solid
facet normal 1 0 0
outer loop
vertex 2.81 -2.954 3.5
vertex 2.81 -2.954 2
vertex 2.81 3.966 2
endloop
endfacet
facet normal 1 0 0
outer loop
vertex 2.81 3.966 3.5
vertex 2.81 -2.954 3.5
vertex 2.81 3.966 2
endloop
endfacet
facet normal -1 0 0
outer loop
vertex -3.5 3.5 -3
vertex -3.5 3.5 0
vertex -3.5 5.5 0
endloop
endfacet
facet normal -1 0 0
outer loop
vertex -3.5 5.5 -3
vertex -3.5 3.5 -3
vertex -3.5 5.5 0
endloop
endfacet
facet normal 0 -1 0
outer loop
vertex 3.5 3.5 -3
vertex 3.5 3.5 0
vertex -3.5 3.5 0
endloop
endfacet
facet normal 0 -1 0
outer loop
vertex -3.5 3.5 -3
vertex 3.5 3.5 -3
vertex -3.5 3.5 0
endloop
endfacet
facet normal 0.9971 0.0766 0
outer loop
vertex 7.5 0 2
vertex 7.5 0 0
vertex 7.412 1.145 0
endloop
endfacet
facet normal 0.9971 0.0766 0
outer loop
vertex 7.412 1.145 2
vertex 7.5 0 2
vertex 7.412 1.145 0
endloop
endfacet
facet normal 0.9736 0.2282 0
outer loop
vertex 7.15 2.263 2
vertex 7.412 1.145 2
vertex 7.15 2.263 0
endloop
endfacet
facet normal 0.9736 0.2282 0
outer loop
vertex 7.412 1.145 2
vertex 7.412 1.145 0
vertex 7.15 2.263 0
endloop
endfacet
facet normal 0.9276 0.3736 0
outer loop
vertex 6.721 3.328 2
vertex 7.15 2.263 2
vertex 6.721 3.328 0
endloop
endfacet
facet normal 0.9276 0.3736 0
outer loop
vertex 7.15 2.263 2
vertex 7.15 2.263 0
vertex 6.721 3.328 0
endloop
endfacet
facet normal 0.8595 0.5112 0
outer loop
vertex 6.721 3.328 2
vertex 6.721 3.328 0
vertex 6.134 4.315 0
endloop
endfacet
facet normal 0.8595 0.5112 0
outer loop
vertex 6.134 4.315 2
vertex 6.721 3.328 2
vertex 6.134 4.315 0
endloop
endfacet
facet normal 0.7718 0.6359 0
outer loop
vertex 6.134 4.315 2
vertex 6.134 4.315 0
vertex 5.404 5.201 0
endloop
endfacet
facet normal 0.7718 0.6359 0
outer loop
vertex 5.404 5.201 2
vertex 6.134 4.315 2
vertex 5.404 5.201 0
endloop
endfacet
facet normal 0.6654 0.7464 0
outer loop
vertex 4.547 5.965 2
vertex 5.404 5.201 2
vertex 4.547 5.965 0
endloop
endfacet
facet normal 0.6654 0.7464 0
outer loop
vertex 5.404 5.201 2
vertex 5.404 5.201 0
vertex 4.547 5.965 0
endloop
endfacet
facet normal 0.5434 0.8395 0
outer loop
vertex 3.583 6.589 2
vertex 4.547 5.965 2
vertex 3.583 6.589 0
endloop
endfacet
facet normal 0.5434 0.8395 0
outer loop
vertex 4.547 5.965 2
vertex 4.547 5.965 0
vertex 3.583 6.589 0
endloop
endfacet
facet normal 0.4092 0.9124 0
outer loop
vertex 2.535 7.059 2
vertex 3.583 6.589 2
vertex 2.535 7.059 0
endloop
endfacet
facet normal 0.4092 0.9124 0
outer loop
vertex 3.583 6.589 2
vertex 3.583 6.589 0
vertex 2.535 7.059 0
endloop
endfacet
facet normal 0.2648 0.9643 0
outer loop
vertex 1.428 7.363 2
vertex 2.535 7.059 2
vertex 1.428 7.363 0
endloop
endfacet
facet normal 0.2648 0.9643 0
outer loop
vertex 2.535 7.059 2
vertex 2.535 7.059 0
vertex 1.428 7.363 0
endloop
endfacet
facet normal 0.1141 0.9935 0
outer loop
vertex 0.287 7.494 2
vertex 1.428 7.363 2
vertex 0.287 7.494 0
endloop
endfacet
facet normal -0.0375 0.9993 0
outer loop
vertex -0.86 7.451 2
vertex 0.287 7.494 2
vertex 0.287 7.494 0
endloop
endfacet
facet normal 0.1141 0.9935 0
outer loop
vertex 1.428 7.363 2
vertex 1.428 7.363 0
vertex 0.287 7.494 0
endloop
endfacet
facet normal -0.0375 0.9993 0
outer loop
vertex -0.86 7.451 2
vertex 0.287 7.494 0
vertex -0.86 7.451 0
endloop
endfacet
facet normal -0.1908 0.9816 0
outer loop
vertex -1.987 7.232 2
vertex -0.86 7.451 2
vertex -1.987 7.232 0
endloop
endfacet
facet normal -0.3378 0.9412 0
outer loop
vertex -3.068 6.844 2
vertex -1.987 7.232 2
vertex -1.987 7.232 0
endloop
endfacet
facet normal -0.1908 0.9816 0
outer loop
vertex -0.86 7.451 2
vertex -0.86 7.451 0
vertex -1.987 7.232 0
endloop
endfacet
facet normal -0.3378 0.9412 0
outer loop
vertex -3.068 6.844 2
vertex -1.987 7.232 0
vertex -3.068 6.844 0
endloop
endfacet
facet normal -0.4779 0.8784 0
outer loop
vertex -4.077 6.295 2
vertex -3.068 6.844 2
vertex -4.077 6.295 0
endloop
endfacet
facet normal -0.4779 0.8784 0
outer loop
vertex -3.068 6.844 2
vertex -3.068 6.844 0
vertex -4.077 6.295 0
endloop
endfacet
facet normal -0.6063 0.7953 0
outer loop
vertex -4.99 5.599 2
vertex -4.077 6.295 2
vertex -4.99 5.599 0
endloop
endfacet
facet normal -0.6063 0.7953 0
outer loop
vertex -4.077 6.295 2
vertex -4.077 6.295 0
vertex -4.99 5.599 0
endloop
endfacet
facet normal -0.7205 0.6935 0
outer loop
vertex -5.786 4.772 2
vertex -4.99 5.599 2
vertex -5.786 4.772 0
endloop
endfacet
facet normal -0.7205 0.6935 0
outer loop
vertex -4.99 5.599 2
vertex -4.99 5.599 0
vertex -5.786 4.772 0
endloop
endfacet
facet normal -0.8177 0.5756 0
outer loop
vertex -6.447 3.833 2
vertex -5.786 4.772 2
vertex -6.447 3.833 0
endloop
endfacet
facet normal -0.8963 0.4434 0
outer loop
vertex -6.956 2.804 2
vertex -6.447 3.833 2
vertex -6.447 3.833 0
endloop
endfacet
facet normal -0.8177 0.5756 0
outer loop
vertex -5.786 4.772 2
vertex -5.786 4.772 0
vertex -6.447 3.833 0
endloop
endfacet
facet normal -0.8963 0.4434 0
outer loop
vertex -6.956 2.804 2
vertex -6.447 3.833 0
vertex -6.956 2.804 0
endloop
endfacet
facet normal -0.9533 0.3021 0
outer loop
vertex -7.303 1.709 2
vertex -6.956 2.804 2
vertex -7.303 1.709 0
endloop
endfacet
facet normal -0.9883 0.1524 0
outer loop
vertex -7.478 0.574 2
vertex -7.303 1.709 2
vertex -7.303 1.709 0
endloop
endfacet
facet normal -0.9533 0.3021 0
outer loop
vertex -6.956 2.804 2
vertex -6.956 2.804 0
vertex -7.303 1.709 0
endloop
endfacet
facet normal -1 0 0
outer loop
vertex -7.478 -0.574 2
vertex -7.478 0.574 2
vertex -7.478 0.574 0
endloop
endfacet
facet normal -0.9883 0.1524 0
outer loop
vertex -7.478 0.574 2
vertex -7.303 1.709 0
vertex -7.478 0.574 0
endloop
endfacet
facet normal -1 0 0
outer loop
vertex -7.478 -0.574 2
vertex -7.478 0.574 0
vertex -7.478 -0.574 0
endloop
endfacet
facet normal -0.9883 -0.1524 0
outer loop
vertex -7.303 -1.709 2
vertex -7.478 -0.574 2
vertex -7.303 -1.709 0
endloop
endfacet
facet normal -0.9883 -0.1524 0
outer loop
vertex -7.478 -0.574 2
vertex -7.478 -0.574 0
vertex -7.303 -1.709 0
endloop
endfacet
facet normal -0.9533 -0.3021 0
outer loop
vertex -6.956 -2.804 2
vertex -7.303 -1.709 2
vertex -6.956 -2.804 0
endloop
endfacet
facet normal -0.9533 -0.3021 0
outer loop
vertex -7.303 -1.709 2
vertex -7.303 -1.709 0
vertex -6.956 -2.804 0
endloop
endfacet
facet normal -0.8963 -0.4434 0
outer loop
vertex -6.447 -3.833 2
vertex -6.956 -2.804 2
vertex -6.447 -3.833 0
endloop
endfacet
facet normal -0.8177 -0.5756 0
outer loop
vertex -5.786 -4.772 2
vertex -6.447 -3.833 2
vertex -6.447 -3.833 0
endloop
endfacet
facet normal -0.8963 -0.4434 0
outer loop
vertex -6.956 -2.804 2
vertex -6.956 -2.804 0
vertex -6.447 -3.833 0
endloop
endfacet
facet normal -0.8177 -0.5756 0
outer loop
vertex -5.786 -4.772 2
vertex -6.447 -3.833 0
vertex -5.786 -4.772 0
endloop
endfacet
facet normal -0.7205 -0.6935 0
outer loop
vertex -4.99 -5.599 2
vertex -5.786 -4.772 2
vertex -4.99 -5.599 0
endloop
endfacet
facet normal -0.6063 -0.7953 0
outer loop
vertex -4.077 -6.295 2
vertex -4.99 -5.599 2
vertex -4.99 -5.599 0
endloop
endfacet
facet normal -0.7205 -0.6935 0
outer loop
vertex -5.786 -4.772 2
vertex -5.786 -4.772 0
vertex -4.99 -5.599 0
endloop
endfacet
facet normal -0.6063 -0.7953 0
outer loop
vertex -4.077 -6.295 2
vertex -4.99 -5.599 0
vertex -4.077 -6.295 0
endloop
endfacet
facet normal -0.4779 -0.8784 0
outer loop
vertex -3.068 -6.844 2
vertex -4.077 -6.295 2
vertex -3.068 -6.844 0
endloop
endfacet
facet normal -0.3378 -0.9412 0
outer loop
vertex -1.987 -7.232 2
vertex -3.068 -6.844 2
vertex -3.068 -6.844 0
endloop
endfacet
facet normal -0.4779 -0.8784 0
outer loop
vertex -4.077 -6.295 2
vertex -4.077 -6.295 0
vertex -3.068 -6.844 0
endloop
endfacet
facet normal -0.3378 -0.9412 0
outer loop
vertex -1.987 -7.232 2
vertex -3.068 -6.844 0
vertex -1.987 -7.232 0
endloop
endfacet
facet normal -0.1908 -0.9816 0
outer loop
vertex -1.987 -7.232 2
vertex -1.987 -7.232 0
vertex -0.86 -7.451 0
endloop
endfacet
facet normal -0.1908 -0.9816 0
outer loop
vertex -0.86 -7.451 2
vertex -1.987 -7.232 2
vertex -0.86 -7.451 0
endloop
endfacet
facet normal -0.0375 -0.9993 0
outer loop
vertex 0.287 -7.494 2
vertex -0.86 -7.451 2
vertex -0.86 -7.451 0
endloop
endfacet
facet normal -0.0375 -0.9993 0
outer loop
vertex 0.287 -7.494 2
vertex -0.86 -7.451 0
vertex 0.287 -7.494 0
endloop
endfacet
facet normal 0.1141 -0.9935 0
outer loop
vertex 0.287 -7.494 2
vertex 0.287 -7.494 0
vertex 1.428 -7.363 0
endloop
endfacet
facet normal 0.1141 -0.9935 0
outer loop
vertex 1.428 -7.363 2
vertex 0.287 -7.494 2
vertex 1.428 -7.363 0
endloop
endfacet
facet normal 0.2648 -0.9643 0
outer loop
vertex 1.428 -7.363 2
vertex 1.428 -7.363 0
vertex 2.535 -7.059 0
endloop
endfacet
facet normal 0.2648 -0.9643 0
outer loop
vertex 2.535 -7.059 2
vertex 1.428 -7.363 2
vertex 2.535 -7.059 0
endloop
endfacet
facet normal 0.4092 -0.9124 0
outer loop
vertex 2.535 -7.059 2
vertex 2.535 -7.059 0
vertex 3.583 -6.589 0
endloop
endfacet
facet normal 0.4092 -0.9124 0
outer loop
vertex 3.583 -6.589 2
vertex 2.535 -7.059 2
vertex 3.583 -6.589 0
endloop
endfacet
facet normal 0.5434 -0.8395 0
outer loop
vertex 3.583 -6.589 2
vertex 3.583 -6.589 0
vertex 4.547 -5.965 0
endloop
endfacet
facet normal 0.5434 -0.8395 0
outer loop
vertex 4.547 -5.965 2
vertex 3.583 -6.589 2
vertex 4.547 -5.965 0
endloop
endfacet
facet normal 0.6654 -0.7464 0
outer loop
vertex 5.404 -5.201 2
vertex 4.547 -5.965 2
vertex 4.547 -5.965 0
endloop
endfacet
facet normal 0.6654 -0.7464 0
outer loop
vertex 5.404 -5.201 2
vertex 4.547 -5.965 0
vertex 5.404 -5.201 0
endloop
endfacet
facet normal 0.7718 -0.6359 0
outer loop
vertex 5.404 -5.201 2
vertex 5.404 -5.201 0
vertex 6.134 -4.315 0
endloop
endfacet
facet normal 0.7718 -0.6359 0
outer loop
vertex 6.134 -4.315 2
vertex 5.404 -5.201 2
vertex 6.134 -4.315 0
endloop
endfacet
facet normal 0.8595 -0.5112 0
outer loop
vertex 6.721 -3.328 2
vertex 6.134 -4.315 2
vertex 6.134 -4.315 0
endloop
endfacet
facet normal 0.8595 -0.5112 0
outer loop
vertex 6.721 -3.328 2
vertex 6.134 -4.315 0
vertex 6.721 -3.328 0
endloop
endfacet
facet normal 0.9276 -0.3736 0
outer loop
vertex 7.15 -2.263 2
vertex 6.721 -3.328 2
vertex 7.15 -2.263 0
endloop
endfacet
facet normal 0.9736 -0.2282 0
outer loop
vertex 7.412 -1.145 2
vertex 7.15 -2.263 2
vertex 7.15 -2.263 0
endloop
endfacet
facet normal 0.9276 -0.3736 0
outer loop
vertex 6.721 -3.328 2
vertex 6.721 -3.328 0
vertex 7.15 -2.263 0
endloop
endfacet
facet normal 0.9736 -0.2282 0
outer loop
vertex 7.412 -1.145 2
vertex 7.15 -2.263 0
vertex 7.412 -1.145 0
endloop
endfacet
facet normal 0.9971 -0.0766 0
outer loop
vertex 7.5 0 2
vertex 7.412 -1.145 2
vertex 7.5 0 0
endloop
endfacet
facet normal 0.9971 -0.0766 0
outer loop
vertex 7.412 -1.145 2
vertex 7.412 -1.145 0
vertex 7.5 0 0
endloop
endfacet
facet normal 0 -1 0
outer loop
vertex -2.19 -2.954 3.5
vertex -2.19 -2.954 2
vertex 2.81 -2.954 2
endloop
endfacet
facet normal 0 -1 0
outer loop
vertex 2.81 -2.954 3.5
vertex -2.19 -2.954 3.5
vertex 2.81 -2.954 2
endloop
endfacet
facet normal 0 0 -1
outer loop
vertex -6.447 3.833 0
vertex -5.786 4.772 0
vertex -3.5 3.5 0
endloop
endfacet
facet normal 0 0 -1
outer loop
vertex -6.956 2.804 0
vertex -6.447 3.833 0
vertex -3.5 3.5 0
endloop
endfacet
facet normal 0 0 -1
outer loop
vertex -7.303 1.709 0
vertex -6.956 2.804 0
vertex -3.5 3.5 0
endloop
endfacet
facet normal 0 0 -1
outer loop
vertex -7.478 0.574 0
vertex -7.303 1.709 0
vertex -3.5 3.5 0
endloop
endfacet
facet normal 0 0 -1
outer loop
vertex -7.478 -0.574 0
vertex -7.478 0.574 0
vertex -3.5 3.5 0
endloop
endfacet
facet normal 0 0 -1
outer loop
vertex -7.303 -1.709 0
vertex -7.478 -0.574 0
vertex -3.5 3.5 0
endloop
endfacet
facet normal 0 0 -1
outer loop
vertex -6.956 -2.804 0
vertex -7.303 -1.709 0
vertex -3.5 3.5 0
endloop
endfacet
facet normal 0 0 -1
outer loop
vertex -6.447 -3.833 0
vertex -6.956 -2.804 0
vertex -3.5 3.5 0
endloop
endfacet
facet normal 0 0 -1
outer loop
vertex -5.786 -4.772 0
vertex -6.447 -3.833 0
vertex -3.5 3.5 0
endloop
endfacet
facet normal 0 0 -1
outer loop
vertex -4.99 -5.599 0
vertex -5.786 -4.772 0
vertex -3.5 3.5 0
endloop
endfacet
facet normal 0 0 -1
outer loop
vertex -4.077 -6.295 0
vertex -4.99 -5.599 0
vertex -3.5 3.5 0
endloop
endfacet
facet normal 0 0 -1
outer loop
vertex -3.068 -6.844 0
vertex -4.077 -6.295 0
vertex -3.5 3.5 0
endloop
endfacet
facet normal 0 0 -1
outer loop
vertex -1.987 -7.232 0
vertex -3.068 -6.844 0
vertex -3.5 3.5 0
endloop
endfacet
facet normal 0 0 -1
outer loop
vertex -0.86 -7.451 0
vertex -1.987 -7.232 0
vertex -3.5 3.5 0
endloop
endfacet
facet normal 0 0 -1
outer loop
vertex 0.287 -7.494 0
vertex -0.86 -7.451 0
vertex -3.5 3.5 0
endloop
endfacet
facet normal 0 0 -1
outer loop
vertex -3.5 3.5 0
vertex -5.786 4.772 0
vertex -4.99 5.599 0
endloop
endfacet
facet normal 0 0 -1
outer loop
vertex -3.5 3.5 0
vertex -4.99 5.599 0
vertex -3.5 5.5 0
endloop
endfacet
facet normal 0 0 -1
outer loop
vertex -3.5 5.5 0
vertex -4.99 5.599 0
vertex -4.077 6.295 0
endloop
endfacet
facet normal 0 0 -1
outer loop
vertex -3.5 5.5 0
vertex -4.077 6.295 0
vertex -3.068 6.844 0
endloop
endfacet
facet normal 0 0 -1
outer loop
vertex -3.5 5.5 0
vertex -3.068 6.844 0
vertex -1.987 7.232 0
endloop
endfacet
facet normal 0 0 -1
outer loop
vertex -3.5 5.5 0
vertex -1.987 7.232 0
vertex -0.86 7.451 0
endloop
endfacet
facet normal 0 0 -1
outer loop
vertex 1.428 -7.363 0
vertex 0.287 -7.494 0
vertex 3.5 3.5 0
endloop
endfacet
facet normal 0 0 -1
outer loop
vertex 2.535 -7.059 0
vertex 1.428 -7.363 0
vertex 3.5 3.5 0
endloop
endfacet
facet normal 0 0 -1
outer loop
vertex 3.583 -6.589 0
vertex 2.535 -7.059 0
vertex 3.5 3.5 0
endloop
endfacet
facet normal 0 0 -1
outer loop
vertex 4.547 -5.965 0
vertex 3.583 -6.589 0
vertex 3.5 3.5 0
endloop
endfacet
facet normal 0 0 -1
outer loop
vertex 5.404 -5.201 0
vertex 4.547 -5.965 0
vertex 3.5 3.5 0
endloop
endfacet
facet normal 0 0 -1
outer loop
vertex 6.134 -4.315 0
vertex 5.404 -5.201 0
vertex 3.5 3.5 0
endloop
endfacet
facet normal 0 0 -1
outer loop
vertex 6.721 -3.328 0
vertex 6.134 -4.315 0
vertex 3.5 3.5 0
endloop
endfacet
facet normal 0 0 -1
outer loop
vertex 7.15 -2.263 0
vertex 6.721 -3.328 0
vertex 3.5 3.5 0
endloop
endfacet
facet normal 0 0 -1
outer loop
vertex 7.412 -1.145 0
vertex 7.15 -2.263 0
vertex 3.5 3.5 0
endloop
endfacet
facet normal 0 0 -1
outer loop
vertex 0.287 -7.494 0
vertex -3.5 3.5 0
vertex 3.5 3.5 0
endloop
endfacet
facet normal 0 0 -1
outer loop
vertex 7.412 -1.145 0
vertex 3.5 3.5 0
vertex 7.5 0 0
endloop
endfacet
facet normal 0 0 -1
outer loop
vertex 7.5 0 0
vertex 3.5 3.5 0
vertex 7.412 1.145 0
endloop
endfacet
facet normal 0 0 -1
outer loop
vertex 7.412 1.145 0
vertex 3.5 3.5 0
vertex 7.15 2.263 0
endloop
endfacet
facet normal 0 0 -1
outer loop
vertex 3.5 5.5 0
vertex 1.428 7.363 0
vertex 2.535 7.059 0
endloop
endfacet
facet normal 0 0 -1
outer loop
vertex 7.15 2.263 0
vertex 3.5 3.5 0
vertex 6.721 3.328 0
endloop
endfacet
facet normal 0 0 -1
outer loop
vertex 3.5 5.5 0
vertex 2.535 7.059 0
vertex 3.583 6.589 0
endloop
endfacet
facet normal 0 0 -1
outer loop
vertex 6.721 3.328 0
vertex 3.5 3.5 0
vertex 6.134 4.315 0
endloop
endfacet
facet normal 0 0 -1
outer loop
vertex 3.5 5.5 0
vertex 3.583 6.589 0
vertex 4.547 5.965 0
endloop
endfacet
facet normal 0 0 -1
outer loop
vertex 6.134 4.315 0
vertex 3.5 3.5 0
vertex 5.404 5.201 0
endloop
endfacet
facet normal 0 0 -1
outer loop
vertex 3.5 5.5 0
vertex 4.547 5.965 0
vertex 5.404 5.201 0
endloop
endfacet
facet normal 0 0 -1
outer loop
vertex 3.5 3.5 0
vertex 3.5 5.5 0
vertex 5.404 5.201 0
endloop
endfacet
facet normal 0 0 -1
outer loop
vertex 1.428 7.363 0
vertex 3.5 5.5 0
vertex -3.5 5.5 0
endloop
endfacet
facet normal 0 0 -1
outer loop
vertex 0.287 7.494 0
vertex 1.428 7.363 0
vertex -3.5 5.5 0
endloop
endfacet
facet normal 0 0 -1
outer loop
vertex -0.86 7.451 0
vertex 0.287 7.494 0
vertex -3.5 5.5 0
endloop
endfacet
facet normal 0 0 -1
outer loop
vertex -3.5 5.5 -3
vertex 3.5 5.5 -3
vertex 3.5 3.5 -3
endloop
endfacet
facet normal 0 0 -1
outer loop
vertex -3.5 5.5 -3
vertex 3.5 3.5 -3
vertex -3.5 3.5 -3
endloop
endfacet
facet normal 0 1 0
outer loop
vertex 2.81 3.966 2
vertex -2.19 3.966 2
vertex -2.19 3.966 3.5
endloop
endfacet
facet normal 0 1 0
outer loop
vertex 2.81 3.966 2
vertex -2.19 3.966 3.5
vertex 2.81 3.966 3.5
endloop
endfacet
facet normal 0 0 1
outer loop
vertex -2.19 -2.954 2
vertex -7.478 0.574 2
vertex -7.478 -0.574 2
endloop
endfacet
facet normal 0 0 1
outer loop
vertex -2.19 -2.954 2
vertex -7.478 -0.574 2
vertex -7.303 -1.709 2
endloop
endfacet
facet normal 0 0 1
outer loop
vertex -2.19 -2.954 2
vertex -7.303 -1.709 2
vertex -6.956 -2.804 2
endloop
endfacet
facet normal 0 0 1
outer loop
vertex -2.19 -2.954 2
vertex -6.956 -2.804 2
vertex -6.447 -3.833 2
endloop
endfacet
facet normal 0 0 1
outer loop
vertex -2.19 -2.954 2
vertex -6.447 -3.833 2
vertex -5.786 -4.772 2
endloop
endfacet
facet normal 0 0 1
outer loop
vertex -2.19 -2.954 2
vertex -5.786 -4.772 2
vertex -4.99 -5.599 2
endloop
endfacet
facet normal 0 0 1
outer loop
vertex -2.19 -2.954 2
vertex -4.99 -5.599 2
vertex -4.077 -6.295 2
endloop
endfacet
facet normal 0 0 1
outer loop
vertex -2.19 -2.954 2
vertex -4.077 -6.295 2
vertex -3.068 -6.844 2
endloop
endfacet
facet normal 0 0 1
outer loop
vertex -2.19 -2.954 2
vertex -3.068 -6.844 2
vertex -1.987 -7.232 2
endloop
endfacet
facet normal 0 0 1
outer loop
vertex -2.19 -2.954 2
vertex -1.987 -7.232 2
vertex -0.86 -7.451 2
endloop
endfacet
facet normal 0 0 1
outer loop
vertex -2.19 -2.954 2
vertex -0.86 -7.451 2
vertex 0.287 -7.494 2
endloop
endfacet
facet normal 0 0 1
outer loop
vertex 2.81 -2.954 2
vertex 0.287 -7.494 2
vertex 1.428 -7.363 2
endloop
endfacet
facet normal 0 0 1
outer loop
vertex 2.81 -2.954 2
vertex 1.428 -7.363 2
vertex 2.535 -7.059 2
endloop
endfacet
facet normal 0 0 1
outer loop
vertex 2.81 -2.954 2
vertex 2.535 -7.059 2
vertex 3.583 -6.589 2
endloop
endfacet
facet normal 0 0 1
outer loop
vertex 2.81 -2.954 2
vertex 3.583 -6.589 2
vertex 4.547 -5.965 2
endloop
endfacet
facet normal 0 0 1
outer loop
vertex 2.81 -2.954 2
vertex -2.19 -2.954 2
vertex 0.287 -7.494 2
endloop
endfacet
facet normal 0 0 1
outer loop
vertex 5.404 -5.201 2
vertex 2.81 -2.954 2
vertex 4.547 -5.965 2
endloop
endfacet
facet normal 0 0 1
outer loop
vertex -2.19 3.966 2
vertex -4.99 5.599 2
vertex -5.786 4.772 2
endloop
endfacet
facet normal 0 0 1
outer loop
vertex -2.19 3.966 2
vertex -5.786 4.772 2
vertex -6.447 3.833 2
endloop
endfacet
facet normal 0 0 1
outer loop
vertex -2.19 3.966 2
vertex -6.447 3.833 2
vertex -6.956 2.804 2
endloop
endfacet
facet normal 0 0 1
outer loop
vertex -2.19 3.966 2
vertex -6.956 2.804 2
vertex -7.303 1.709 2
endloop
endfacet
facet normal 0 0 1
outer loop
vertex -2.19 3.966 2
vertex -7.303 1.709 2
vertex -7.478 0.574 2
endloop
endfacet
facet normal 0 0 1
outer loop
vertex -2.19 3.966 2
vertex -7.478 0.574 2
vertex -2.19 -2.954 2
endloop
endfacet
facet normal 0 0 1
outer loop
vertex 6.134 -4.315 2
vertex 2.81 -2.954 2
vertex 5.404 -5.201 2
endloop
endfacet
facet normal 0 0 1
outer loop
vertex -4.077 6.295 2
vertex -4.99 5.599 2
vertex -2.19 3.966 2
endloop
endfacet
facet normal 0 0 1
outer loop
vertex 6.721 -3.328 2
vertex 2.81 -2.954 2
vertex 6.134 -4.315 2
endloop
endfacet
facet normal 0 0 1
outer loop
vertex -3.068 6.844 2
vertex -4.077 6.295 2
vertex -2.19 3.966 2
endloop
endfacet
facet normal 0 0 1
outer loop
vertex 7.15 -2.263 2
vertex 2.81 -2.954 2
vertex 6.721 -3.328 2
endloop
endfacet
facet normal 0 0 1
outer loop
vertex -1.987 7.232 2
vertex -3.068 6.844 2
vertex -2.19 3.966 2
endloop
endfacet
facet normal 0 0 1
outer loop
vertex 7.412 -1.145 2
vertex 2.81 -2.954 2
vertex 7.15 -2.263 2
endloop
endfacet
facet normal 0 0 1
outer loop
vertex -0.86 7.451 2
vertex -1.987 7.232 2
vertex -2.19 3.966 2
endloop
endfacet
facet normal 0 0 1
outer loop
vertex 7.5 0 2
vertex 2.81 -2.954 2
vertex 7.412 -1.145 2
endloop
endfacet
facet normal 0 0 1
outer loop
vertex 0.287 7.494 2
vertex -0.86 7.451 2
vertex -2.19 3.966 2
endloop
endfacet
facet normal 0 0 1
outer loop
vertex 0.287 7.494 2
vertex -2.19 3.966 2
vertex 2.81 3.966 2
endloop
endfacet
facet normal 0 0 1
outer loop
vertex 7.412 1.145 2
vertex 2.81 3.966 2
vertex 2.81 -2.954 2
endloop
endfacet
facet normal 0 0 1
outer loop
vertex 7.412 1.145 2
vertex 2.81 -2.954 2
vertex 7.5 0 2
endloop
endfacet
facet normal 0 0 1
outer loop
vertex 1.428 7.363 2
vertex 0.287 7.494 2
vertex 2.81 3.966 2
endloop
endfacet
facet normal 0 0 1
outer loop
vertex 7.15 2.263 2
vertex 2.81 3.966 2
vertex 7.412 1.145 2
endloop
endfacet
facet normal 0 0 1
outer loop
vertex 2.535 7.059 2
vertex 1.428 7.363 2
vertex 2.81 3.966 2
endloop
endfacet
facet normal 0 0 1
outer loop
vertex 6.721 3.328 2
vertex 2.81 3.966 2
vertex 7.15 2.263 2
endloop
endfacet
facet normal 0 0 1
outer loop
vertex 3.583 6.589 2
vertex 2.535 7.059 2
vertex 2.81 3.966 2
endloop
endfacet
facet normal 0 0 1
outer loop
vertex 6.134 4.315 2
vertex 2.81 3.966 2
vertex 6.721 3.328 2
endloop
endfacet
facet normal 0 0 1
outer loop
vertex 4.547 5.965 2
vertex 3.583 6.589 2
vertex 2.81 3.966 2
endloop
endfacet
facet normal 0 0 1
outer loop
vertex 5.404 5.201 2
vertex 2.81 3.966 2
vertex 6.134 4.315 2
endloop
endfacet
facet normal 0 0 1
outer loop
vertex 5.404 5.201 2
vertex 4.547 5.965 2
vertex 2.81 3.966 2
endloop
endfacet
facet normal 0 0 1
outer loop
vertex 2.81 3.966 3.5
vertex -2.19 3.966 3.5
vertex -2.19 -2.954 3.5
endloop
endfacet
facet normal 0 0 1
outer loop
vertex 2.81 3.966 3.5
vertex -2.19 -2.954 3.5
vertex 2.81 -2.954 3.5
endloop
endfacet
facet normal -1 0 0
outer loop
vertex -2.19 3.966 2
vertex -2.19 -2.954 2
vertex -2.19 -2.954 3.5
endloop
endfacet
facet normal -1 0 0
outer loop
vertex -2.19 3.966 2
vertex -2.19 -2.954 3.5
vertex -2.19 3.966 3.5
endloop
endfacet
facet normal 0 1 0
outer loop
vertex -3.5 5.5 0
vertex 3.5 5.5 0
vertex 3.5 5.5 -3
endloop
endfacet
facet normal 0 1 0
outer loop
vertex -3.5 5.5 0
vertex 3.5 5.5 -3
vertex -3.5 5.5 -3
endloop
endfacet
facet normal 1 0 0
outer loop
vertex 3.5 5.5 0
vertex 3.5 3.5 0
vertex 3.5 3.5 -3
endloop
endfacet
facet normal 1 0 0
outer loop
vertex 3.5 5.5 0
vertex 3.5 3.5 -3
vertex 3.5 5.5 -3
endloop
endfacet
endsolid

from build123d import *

# Parameters (mm, degrees)
SKETCH1_R           = 7.5
BOSS_EXTRUDE1_DEPTH = 2
SKETCH2_W           = 5
SKETCH2_H           = 6.920756948
BOSS_EXTRUDE2_DEPTH = 1.5
SKETCH3_W           = 7
SKETCH3_H           = 2
BOSS_EXTRUDE3_DEPTH = 3


with BuildPart() as part:
    # Sketch1 → Boss-Extrude1 (new body)
    with BuildSketch(Plane.XY):
        Circle(SKETCH1_R)
    extrude(amount=BOSS_EXTRUDE1_DEPTH)

    # Sketch2 → Boss-Extrude2 (add)
    with BuildSketch(Plane.XY.offset(2)):
        with Locations((0.310238116, 0.506092566)):
            Rectangle(SKETCH2_W, SKETCH2_H)
    extrude(amount=BOSS_EXTRUDE2_DEPTH)

    # Sketch3 → Boss-Extrude3 (add)
    with BuildSketch(Plane(origin=(0, 0, 0), x_dir=(-1, 0, 0), z_dir=(0, 0, -1))):
        with Locations((0, 4.5)):
            Rectangle(SKETCH3_W, SKETCH3_H)
    extrude(amount=BOSS_EXTRUDE3_DEPTH)


solid = part.part
